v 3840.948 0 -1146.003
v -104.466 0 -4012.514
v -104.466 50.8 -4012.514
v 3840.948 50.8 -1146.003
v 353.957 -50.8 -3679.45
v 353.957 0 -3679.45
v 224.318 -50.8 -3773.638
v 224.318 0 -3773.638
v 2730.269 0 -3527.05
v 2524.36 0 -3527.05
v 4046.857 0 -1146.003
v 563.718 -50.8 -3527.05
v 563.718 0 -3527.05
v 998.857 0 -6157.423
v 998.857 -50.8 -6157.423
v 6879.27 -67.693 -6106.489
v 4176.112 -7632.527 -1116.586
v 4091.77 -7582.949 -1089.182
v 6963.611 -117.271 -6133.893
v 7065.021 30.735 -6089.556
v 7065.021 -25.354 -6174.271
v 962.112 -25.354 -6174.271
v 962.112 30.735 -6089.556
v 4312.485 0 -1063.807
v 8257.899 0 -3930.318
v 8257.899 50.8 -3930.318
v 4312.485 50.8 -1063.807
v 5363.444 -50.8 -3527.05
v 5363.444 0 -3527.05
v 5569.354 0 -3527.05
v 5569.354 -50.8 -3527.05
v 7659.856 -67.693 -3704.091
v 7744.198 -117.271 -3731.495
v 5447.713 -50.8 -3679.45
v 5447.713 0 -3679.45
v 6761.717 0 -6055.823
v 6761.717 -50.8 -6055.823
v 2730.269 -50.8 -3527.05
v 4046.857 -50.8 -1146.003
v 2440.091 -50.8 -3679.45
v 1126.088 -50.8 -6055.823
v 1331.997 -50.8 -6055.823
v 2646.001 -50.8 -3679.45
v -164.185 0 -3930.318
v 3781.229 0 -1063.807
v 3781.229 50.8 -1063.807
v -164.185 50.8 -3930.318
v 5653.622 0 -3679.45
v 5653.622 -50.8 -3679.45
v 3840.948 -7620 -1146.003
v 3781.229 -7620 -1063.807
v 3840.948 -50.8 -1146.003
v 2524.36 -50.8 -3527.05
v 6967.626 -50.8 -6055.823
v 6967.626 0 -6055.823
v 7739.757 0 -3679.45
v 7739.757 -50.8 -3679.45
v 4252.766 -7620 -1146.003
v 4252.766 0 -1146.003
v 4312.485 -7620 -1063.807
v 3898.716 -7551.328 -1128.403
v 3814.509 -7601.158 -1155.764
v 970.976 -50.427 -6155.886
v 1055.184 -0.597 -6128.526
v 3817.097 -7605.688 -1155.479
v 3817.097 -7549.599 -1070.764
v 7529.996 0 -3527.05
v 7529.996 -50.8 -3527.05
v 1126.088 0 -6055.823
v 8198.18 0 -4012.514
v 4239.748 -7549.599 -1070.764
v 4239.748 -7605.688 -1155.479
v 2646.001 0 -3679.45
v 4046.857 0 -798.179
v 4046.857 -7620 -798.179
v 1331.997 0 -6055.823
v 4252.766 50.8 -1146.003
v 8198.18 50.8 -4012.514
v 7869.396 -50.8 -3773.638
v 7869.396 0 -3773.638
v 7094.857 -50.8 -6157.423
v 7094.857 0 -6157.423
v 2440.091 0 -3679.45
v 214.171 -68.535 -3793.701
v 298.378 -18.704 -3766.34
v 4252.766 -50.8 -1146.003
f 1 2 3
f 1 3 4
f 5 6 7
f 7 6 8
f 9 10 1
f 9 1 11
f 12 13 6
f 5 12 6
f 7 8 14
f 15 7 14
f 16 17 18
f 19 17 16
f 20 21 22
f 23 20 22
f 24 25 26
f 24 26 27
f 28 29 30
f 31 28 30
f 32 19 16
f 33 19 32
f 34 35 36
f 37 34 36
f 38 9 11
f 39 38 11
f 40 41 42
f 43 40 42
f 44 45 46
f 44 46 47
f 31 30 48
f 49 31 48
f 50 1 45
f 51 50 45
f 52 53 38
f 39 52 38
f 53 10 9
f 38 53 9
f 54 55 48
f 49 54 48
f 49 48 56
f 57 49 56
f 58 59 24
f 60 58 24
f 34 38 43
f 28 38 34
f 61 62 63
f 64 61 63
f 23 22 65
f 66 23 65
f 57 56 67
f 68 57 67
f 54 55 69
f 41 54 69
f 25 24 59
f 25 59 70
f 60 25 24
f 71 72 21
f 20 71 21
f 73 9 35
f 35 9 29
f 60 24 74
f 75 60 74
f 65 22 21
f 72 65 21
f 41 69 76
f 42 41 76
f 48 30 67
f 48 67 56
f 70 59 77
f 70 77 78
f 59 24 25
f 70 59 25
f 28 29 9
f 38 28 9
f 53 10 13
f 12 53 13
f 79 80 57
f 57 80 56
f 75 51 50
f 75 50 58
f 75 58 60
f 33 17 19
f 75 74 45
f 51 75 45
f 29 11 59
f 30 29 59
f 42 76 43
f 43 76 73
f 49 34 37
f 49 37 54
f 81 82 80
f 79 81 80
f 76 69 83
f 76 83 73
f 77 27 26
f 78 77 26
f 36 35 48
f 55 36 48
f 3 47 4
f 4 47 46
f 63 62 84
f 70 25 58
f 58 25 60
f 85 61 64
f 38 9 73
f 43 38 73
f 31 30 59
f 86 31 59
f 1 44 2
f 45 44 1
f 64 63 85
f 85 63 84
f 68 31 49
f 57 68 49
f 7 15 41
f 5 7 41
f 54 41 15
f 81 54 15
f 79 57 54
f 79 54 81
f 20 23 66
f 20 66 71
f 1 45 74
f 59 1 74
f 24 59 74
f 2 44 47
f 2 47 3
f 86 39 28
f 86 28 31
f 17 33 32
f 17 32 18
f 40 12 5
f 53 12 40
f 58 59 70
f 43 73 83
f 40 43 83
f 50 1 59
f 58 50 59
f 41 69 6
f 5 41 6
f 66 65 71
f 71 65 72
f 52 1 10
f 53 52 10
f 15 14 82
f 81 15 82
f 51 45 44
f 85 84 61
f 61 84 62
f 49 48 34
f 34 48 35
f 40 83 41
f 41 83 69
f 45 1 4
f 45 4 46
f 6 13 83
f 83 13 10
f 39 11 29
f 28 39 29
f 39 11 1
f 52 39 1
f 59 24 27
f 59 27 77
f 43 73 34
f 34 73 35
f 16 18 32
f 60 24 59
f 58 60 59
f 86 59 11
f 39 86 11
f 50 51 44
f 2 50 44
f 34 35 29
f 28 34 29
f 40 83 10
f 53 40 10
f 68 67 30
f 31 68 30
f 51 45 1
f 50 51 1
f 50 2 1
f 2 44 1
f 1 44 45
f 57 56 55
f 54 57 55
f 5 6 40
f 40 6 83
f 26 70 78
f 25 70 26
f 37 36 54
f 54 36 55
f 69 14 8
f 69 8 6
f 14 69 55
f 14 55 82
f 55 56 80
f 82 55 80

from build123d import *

# Parameters (mm, degrees)
F1_DEPTH  = 50.8
F2_DEPTH  = 7620
F4_DEPTH  = 5016.876130589
F6_DEPTH  = 5016.876130589
F7_DEPTH  = 50.8
F8_DEPTH  = 50.8
F9_DEPTH  = 50.8
F10_DEPTH = 50.8
F13_DEPTH = 101.6
F16_DEPTH = 101.6
F19_DEPTH = 101.6
F20_DEPTH = 7620


# Not quite as in the source:
# - a feature names something its author has since deleted; it is built from what else it names


with BuildPart() as f1:
    # F0 (on Front) → F1 (new body)
    with BuildSketch(Plane.XZ):
        Polygon((3781.2287860666, -1063.8068812603), (-164.1852921012, -3930.3179996402), (-104.4663104683, -4012.5141262687), (224.3181960457, -3773.6381997371), (353.9573792386, -3679.4498198516), (563.7179839184, -3527.0498198516), (3840.9477676995, -1146.0030078888), align=None)
    extrude(amount=-F1_DEPTH)


with BuildPart() as f1b:
    # F0 (on Front) → F1, piece 2 (new body)
    with BuildSketch(Plane.XZ):
        Polygon((8257.8992157481, -3930.3179996402), (4312.4851375803, -1063.8068812603), (4252.7661559474, -1146.0030078888), (7529.9959397285, -3527.0498198516), (7739.7565444083, -3679.4498198516), (7869.3957276012, -3773.6381997371), (8198.1802341152, -4012.5141262687), align=None)
    extrude(amount=-F1_DEPTH)


with BuildPart() as f2:
    # F0 (on Front) → F2 (new body)
    with BuildSketch(Plane.XZ):
        Polygon((8257.8992157481, -3930.3179996402), (4312.4851375803, -1063.8068812603), (4252.7661559474, -1146.0030078888), (7529.9959397285, -3527.0498198516), (7739.7565444083, -3679.4498198516), (7869.3957276012, -3773.6381997371), (8198.1802341152, -4012.5141262687), align=None)
    extrude(amount=F2_DEPTH)

    # F3 (on face) → F4 (cut, through all)
    with BuildSketch(Plane(origin=(984.0567377882, 0, 1354.4379026095), x_dir=(0.8090169944, 0, -0.5877852523), z_dir=(0.5877852523, 0, 0.8090169944))):
        Polygon((8990.9637603839, 0), (4114.1637603839, -7620), (8990.9637603839, -7620), align=None)
    extrude(amount=-F4_DEPTH, mode=Mode.SUBTRACT)


with BuildPart() as f2b:
    # F0 (on Front) → F2, piece 2 (new body)
    with BuildSketch(Plane.XZ):
        Polygon((3781.2287860666, -1063.8068812603), (-164.1852921012, -3930.3179996402), (-104.4663104683, -4012.5141262687), (224.3181960457, -3773.6381997371), (353.9573792386, -3679.4498198516), (563.7179839184, -3527.0498198516), (3840.9477676995, -1146.0030078888), align=None)
    extrude(amount=F2_DEPTH)

    # F5 (on face) → F6 (cut, through all)
    with BuildSketch(Plane(origin=(1812.2526490272, 0, -2494.3517814471), x_dir=(0.8090169944, 0, 0.5877852523), z_dir=(-0.5877852523, 0, 0.8090169944))):
        Polygon((-2443.0116485444, -7620), (2433.7883514556, -7620), (-2443.0116485444, 0), align=None)
    extrude(amount=-F6_DEPTH, mode=Mode.SUBTRACT)


with BuildPart() as f7:
    # F0 (on Front) → F7 (new body)
    with BuildSketch(Plane.XZ):
        Polygon((4252.7661559474, -1146.0030078888), (4046.8569618235, -1146.0030078888), (5363.4444852873, -3527.0498198516), (5569.3536794113, -3527.0498198516), align=None)
    extrude(amount=F7_DEPTH)


with BuildPart() as f7b:
    # F0 (on Front) → F7, piece 2 (new body)
    with BuildSketch(Plane.XZ):
        Polygon((4046.8569618235, -1146.0030078888), (3840.9477676995, -1146.0030078888), (2524.3602442356, -3527.0498198516), (2730.2694383596, -3527.0498198516), align=None)
    extrude(amount=F7_DEPTH)


with BuildPart() as f8:
    # F0 (on Front) → F8 (new body)
    with BuildSketch(Plane.XZ):
        Polygon((353.9573792386, -3679.4498198516), (224.3181960457, -3773.6381997371), (998.8569618235, -6157.4234080753), (7094.8569618235, -6157.4234080753), (7869.3957276012, -3773.6381997371), (7739.7565444083, -3679.4498198516), (6967.6259599868, -6055.8234080753), (6761.7167658628, -6055.8234080753), (1331.9971577841, -6055.8234080753), (1126.0879636601, -6055.8234080753), align=None)
    extrude(amount=F8_DEPTH)


with BuildPart() as f9:
    # F0 (on Front) → F9 (new body)
    with BuildSketch(Plane.XZ):
        Polygon((5653.6224714266, -3679.4498198516), (5447.7132773026, -3679.4498198516), (6761.7167658628, -6055.8234080753), (6967.6259599868, -6055.8234080753), align=None)
    extrude(amount=F9_DEPTH)


with BuildPart() as f9b:
    # F0 (on Front) → F9, piece 2 (new body)
    with BuildSketch(Plane.XZ):
        Polygon((7739.7565444083, -3679.4498198516), (7529.9959397285, -3527.0498198516), (5569.3536794113, -3527.0498198516), (5653.6224714266, -3679.4498198516), align=None)
    extrude(amount=F9_DEPTH)


with BuildPart() as f9c:
    # F0 (on Front) → F9, piece 3 (new body)
    with BuildSketch(Plane.XZ):
        Polygon((2524.3602442356, -3527.0498198516), (563.7179839184, -3527.0498198516), (353.9573792386, -3679.4498198516), (2440.0914522204, -3679.4498198516), align=None)
    extrude(amount=F9_DEPTH)


with BuildPart() as f9d:
    # F0 (on Front) → F9, piece 4 (new body)
    with BuildSketch(Plane.XZ):
        Polygon((2646.0006463443, -3679.4498198516), (2440.0914522204, -3679.4498198516), (1126.0879636601, -6055.8234080753), (1331.9971577841, -6055.8234080753), align=None)
    extrude(amount=F9_DEPTH)


with BuildPart() as f10:
    # F0 (on Front) → F10 (new body)
    with BuildSketch(Plane.XZ):
        Polygon((5363.4444852873, -3527.0498198516), (2730.2694383596, -3527.0498198516), (2646.0006463443, -3679.4498198516), (5447.7132773026, -3679.4498198516), align=None)
    extrude(amount=F10_DEPTH)


with BuildPart() as f13:
    # F12 (on 3pt) → F13 (new body)
    with BuildSketch(Plane(origin=(0, -2849.7769817203, -4304.2750772285), x_dir=(1, 0, 0), z_dir=(0, 0.5520500585, 0.8338109695))):
        Polygon((4239.7484779358, -5703.8235664368), (7065.0205612183, 3387.3665332794), (962.1124267578, 3387.3665332794), (3817.0967102051, -5703.8235664368), align=None)
    extrude(amount=F13_DEPTH)


with BuildPart() as f16:
    # F15 (on face) → F16 (new body)
    with BuildSketch(Plane(origin=(6219.7211580064, -3656.1622452923, -2020.9099093128), x_dir=(0.4640972567, 0.8728543999, -0.1507943397), z_dir=(0.8301338648, -0.4879807338, -0.2697268432))):
        Polygon((4054.3885231018, -1155.7741165161), (-4555.5882453918, 228.5533994436), (4054.3885231018, -3681.804895401), align=None)
    extrude(amount=-F16_DEPTH)


with BuildPart() as f19:
    # F18 (on face) → F19 (new body)
    with BuildSketch(Plane(origin=(-727.4852094478, -430.4918680103, -236.3742732677), x_dir=(-0.4664493221, 0.8714671704, -0.151558572), z_dir=(0.8288145312, 0.4904538417, 0.2692981657))):
        Polygon((-8228.2686233521, -2277.9448032379), (436.1208975315, -6154.6440124512), (415.3425097466, -3674.2062568665), align=None)
    extrude(amount=F19_DEPTH)


with BuildPart() as f20:
    # F0 (on Front) → F20 (new body)
    with BuildSketch(Plane.XZ):
        Polygon((4046.8569618235, -798.1787055034), (3781.2287860666, -1063.8068812603), (3840.9477676995, -1146.0030078888), (4046.8569618235, -1146.0030078888), (4252.7661559474, -1146.0030078888), (4312.4851375803, -1063.8068812603), align=None)
    extrude(amount=F20_DEPTH)


solid = Compound([f1.part, f1b.part, f2.part, f2b.part, f7.part, f7b.part, f8.part, f9.part, f9b.part, f9c.part, f9d.part, f10.part, f13.part, f16.part, f19.part, f20.part])
